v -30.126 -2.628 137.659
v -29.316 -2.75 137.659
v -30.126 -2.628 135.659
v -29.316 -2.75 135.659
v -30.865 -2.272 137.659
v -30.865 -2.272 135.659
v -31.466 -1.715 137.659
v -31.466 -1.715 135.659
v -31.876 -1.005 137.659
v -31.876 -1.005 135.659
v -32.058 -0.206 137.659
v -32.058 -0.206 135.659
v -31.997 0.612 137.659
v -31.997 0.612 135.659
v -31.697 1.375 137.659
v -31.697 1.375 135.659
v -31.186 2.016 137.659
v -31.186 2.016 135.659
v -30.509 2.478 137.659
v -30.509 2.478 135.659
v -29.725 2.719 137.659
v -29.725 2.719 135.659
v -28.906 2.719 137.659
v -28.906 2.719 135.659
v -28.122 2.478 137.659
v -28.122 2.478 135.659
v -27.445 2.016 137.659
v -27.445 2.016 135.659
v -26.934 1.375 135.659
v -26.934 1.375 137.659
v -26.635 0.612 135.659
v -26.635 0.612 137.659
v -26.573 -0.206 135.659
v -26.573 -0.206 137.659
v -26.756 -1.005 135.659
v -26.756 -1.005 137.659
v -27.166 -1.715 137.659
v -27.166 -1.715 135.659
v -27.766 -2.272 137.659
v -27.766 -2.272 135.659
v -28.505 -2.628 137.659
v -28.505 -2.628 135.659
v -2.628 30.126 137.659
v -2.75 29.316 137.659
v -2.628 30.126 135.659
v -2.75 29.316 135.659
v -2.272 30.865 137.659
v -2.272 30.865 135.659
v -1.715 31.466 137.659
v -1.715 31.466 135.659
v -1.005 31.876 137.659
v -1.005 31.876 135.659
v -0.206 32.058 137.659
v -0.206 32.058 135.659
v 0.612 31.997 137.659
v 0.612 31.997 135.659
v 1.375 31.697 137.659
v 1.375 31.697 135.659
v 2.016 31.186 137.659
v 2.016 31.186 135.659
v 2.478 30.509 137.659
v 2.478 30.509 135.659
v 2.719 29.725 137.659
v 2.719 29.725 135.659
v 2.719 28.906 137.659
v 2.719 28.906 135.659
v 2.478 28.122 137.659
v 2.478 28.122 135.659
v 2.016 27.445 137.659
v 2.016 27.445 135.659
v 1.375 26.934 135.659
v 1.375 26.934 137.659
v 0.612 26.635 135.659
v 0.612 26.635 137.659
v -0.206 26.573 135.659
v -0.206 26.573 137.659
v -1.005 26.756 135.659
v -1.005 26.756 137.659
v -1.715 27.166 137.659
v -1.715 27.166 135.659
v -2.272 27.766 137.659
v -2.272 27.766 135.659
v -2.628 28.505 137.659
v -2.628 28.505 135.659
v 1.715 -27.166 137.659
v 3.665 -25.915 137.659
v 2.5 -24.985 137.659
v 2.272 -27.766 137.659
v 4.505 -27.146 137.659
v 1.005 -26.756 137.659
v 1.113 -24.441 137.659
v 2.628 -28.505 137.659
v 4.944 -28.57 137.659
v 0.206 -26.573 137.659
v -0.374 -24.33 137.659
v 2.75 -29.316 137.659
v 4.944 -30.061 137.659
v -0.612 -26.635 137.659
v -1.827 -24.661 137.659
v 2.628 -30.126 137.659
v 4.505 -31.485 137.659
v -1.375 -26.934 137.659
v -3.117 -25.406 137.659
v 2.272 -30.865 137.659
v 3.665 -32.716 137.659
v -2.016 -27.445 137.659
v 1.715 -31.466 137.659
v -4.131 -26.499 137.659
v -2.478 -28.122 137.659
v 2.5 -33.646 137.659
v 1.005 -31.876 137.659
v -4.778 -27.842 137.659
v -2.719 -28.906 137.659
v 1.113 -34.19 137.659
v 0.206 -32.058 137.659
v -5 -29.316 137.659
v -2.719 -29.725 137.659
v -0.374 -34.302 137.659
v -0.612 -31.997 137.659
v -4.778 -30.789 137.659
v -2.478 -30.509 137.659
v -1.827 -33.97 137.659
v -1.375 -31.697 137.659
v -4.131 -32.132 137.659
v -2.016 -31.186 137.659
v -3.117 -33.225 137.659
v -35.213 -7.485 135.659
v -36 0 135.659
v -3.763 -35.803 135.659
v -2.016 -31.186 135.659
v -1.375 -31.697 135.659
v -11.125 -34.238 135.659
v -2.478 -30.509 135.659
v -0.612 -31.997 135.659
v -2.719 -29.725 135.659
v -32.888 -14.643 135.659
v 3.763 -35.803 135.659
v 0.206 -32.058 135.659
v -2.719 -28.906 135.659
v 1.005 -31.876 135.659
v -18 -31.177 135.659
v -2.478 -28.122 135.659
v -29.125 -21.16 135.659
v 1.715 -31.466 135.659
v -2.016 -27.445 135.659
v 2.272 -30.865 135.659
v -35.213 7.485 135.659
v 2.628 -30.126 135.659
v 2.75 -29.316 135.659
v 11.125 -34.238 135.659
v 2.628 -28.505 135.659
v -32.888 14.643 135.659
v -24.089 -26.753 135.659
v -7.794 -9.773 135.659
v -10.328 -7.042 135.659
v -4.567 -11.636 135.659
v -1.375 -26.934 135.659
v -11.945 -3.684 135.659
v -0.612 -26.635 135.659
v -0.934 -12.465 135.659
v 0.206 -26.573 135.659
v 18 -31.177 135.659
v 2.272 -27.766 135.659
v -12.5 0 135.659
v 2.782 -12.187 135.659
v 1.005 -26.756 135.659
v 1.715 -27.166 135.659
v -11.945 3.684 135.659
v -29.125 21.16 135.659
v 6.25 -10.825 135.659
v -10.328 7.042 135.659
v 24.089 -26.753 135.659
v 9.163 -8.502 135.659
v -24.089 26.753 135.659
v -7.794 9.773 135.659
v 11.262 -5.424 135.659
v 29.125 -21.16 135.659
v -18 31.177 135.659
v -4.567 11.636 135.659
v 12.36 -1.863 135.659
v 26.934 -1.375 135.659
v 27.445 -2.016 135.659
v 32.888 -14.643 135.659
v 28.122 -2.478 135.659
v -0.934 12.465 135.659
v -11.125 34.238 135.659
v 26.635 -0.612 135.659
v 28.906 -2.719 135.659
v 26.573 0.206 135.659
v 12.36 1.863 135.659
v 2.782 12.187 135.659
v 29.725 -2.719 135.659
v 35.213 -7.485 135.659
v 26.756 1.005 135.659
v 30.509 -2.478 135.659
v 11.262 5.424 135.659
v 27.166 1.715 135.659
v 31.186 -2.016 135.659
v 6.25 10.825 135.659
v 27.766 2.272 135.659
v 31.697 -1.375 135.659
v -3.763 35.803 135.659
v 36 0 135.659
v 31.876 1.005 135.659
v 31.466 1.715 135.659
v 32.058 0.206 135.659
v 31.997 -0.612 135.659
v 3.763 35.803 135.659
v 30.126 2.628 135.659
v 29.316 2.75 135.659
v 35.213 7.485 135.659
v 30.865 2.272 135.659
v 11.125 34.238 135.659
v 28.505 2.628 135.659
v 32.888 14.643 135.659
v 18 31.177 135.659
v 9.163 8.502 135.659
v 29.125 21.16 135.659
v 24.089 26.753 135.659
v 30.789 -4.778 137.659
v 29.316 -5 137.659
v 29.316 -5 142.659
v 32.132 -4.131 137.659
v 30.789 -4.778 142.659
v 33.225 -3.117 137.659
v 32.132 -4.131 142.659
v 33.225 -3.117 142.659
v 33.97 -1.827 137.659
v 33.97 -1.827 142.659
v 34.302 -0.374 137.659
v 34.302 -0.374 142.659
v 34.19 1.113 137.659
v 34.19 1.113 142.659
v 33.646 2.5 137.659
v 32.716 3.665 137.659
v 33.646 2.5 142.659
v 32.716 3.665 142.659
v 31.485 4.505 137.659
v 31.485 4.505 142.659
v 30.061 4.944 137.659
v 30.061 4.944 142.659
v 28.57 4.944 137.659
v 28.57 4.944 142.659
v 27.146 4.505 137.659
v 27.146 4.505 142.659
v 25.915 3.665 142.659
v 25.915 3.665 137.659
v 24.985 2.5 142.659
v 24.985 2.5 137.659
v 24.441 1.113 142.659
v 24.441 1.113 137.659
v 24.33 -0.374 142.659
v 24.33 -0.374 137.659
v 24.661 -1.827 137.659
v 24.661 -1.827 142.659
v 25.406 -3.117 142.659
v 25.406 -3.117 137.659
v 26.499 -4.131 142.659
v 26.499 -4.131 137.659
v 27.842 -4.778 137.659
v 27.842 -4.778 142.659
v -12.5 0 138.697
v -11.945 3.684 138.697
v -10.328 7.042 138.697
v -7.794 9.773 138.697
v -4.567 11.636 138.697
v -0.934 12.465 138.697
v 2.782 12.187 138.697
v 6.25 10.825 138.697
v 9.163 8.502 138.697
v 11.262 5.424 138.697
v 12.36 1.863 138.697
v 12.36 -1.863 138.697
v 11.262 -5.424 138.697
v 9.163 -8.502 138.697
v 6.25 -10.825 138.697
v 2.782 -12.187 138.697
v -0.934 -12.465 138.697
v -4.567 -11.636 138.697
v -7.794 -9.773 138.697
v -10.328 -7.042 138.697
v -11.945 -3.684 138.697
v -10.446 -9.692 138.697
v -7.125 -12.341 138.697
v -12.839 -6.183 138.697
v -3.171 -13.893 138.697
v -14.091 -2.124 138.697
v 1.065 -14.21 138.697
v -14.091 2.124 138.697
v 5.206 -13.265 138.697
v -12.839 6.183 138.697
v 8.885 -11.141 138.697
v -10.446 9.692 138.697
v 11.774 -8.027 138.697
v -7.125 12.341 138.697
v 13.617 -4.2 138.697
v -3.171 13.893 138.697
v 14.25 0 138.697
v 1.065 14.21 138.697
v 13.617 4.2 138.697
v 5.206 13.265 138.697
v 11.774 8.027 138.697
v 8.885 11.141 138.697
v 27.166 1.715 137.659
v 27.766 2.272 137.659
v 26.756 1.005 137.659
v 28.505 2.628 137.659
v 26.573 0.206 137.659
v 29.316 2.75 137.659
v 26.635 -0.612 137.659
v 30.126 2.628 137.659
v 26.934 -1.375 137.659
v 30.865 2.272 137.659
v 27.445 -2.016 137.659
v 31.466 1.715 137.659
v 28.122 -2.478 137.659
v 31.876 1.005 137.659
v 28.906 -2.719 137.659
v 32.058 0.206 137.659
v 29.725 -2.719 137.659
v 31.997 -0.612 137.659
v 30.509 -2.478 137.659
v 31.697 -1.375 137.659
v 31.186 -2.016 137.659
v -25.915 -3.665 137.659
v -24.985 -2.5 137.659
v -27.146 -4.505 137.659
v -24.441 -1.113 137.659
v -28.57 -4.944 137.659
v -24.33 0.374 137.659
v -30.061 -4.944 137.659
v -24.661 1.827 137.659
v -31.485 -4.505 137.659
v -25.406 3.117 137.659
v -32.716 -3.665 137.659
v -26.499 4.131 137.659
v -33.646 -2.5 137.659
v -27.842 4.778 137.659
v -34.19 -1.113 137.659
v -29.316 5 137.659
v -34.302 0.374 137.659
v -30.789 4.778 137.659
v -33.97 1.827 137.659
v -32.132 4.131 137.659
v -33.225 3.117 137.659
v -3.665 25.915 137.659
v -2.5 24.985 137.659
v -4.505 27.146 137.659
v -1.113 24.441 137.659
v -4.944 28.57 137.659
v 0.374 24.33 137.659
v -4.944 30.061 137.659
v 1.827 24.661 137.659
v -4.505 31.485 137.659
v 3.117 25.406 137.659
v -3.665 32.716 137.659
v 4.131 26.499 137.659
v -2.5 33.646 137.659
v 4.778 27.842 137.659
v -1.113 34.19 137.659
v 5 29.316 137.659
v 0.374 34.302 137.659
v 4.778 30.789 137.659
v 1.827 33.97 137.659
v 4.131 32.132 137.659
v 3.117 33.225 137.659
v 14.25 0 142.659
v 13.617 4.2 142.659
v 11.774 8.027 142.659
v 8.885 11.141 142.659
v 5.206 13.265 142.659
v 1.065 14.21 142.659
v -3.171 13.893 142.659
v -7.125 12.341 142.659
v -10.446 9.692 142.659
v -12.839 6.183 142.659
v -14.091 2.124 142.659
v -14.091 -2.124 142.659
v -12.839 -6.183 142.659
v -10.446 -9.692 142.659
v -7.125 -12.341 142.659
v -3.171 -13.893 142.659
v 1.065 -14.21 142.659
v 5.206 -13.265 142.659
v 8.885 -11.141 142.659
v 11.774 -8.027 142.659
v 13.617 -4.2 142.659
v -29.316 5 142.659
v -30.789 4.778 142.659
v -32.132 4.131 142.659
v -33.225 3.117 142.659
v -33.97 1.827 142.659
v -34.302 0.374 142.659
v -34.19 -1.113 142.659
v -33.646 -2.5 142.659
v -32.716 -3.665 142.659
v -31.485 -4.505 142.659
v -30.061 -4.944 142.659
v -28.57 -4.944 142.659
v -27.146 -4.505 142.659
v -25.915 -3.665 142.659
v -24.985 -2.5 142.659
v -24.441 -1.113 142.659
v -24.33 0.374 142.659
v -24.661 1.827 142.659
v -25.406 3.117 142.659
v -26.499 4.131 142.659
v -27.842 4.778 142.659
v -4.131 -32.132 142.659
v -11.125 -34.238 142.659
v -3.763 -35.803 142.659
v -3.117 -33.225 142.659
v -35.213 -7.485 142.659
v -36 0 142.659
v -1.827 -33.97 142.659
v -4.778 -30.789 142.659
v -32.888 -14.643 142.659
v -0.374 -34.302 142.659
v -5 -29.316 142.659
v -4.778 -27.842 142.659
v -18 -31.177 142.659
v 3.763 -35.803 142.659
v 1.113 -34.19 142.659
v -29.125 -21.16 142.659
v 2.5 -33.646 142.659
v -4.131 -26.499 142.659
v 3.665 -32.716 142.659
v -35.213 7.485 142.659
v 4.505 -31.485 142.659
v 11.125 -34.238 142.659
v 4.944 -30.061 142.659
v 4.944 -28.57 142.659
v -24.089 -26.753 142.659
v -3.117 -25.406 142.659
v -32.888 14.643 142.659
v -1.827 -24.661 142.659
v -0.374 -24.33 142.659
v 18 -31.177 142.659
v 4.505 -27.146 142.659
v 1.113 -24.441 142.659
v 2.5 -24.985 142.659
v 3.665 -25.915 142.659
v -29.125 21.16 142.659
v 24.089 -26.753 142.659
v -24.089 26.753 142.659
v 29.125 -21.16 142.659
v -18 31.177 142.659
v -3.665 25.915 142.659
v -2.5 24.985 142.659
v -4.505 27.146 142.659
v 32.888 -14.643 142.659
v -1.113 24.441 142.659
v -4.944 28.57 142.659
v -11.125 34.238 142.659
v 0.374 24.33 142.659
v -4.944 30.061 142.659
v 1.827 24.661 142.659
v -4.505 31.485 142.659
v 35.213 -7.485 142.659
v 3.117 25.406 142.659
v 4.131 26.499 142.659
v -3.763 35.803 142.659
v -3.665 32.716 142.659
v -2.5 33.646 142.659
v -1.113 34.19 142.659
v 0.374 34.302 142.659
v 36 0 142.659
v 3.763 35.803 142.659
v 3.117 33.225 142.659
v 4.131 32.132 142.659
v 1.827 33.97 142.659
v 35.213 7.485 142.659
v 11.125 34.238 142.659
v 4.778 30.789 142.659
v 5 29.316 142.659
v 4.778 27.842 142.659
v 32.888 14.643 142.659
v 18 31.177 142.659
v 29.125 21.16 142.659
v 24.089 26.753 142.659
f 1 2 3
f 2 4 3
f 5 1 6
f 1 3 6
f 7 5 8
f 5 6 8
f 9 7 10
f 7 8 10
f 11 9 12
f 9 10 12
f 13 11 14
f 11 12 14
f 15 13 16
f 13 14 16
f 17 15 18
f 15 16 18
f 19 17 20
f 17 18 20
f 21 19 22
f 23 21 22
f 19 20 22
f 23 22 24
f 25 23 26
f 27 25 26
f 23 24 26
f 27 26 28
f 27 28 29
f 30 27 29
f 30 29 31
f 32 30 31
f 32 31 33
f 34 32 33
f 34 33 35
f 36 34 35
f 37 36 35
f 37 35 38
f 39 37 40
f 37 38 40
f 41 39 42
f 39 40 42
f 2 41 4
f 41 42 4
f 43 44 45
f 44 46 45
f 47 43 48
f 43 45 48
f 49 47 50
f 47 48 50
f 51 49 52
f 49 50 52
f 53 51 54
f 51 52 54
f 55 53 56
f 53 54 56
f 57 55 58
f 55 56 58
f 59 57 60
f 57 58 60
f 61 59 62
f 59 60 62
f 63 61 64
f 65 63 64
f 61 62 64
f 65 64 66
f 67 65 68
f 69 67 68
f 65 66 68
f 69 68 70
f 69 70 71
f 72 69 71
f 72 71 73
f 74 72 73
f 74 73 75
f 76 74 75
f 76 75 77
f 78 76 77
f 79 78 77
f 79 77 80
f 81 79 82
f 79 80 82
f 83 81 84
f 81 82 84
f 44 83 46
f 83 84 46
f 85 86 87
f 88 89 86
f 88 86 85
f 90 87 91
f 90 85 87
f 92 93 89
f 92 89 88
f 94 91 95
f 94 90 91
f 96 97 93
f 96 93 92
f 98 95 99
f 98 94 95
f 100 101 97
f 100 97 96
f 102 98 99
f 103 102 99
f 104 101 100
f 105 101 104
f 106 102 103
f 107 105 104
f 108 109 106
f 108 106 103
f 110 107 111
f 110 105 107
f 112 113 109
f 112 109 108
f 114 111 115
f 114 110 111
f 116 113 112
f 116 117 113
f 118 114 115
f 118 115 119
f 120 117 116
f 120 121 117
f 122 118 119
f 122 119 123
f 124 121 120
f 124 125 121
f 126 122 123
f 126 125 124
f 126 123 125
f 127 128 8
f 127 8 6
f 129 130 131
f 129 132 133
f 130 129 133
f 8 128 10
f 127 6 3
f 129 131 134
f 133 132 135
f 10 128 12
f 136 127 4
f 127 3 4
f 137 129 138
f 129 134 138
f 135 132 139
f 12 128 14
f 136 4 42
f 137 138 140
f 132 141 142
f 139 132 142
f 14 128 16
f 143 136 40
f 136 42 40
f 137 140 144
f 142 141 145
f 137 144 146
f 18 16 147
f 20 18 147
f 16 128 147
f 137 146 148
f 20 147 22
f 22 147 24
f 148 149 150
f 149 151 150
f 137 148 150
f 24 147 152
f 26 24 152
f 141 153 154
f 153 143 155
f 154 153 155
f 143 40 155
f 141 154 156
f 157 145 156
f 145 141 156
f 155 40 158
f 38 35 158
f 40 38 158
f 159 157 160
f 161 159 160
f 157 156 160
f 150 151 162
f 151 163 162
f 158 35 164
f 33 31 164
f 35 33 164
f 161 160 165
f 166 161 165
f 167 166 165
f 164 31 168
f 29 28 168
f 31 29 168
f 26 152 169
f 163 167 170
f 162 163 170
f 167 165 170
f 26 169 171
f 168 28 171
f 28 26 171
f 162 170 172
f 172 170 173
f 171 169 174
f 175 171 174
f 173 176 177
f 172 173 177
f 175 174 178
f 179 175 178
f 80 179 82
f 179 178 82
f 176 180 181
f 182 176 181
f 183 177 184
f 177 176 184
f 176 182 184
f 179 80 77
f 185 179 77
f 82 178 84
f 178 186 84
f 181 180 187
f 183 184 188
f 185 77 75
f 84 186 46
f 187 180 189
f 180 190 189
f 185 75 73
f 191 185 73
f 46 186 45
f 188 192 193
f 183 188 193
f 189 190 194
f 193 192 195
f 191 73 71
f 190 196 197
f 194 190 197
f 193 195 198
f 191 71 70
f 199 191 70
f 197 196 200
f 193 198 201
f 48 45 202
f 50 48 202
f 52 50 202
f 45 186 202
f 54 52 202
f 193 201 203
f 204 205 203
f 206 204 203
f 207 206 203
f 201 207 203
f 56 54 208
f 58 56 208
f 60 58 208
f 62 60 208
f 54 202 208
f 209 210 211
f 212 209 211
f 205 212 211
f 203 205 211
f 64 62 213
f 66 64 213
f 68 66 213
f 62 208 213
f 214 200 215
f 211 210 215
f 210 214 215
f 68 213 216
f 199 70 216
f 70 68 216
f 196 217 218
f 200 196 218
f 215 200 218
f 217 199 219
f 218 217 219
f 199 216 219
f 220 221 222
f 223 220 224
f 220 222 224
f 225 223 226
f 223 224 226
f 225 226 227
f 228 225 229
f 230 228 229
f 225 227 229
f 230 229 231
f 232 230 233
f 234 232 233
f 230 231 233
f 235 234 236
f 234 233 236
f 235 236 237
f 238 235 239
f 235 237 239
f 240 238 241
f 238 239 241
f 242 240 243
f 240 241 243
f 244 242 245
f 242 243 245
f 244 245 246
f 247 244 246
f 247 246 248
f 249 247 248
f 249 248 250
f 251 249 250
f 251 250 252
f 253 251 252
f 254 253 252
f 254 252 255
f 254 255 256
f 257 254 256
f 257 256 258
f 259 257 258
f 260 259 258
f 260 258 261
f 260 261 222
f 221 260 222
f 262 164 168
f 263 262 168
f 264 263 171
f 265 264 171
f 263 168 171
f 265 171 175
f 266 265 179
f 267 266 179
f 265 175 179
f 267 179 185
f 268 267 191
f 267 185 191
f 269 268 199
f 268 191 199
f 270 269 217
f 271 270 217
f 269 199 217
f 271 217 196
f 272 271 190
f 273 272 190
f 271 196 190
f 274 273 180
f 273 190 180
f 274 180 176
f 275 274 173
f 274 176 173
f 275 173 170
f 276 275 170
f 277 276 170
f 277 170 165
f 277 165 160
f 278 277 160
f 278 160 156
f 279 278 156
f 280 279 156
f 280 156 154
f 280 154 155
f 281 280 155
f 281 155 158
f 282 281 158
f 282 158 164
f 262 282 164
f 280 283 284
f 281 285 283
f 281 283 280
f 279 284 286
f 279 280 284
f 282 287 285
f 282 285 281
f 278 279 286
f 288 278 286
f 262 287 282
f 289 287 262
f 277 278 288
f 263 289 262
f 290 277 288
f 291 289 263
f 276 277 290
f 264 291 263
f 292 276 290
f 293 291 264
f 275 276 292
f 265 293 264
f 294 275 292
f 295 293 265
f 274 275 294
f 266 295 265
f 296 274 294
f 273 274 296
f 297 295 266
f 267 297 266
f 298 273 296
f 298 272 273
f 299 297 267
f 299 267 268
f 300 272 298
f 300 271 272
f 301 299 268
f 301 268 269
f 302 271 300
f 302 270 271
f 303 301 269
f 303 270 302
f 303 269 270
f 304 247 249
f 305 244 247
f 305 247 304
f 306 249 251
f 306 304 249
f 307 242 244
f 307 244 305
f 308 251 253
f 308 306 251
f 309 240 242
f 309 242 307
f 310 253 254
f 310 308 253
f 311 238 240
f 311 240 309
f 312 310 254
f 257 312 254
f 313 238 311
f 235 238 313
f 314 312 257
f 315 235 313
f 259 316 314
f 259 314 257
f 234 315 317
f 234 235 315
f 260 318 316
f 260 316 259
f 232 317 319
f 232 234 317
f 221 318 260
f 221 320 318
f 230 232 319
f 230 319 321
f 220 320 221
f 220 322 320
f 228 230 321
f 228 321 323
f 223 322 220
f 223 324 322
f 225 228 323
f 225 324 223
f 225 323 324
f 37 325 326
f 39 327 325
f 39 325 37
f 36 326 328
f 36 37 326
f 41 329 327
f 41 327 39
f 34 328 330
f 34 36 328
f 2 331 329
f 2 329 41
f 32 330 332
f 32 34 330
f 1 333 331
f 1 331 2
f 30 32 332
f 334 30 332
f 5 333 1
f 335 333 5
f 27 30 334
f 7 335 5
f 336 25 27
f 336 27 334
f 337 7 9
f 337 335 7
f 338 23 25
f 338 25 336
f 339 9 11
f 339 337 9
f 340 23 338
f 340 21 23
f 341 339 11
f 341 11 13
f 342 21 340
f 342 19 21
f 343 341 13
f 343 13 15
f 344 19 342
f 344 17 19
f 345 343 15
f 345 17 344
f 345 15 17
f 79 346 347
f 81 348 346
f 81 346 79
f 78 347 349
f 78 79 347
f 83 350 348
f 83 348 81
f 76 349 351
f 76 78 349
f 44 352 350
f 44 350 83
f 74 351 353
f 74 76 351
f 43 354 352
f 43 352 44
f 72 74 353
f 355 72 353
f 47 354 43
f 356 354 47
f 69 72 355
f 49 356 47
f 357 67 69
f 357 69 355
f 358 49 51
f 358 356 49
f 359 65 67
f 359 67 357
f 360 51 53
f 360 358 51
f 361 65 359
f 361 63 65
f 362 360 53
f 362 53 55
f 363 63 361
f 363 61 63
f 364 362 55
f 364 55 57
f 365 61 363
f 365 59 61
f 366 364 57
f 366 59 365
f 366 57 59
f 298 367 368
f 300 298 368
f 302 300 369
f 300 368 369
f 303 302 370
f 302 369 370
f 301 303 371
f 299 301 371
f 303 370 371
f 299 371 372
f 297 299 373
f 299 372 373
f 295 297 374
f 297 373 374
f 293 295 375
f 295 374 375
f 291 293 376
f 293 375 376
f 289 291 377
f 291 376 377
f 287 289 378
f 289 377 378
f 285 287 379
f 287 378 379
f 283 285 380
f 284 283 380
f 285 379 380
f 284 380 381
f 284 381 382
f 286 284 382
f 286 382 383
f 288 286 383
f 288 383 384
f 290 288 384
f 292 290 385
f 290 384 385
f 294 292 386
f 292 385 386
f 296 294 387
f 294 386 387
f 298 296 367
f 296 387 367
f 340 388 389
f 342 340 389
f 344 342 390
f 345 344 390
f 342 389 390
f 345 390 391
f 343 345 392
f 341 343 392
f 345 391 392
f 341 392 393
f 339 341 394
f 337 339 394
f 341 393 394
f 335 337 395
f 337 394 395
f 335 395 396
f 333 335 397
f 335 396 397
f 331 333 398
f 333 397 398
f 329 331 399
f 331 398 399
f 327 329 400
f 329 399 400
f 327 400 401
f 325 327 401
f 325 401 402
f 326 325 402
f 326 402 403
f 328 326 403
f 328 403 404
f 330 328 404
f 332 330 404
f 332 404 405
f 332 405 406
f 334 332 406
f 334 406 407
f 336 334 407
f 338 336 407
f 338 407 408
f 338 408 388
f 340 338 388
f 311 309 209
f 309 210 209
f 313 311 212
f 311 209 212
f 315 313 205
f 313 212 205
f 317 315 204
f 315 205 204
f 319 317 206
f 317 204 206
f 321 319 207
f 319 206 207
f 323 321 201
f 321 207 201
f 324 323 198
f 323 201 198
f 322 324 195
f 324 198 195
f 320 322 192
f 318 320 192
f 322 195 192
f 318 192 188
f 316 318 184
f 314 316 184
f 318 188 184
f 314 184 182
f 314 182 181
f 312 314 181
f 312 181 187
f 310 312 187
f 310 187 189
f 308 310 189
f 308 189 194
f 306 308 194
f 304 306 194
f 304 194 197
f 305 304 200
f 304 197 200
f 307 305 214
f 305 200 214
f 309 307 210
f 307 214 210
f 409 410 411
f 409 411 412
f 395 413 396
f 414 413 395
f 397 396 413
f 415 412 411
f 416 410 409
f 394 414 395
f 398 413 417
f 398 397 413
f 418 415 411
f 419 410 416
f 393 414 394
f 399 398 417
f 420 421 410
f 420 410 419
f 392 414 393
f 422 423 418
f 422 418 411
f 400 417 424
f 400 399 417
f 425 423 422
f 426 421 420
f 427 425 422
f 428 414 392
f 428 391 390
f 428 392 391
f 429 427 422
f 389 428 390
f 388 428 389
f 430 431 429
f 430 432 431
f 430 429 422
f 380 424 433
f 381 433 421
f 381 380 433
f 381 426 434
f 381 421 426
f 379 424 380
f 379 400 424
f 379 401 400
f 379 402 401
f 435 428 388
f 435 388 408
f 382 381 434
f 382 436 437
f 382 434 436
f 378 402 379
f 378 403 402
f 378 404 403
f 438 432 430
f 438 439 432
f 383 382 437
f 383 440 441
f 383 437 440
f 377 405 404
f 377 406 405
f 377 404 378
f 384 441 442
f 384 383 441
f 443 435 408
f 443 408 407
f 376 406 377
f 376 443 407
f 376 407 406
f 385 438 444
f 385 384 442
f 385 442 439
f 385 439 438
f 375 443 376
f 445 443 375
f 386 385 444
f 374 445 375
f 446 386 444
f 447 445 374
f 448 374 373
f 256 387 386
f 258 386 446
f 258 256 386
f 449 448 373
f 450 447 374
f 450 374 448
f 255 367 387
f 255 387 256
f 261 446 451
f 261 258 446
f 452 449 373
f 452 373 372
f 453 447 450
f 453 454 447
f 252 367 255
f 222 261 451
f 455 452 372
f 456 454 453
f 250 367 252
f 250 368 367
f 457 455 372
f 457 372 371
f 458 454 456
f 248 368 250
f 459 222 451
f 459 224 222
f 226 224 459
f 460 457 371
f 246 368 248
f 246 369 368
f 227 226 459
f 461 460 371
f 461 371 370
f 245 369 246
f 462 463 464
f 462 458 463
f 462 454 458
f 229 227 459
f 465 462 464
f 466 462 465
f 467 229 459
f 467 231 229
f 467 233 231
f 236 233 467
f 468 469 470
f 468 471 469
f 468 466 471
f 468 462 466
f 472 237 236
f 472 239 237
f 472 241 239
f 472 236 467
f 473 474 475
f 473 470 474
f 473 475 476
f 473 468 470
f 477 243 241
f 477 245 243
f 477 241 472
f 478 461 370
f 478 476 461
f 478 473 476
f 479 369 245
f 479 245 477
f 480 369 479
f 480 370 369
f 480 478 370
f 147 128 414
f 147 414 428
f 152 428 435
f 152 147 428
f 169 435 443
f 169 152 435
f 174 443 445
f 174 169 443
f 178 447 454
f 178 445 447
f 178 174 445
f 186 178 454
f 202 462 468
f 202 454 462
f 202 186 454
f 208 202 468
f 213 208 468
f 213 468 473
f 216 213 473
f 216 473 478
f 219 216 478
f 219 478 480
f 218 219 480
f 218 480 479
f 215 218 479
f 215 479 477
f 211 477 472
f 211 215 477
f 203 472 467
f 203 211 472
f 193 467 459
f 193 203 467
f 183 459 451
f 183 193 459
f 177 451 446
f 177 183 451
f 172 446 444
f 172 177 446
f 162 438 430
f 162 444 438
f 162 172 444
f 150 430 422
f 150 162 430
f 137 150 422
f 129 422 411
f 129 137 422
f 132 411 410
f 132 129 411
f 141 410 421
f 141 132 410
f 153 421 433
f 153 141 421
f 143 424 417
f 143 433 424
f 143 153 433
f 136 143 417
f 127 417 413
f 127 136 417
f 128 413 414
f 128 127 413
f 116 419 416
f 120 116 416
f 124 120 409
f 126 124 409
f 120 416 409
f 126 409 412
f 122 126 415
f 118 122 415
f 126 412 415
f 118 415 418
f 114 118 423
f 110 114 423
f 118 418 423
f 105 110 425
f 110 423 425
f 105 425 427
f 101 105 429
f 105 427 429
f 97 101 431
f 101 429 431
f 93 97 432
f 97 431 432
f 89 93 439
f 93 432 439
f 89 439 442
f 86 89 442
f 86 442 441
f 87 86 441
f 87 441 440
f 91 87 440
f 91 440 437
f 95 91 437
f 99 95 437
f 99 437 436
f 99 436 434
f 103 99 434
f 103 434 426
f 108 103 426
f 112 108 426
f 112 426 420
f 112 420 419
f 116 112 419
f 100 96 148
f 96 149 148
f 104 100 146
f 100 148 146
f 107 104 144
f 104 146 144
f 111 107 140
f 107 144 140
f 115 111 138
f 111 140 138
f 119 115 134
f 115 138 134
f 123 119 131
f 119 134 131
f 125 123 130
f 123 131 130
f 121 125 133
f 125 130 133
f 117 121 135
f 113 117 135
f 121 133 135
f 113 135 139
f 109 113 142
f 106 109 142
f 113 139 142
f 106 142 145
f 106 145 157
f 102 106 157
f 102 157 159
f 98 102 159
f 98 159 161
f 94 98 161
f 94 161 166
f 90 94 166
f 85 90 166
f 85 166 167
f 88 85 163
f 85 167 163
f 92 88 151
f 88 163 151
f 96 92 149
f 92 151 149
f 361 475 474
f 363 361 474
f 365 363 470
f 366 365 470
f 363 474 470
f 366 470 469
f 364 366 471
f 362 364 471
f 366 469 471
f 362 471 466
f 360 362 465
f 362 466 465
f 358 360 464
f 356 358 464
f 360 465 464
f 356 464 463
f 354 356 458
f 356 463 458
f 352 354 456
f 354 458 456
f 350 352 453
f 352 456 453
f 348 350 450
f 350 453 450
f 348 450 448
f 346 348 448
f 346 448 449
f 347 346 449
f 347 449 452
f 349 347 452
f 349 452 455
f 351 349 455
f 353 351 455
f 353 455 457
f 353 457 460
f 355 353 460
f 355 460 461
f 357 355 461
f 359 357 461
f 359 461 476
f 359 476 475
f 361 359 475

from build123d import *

# Parameters (mm, degrees)
SKETCH1_W                      = 7
SKETCH1_H                      = 26.5
SKETCH2_R                      = 12.5
SHAFT_THRU_DEPTH               = 52.39066063
CBORE_FOR_M5_SHCS1_D           = 5.5
CBORE_FOR_M5_SHCS1_CBORE_D     = 10
CBORE_FOR_M5_SHCS1_CBORE_DEPTH = 5
CIRPATTERN1_COUNT              = 4
SKETCH5_R                      = 14.25
SEAL_SEAT_DEPTH                = 3.9624


with BuildPart() as part:
    # Sketch1 → Main_body (revolve)
    with BuildSketch(Plane(origin=(0, 0, 0), x_dir=(0, 0, -1), z_dir=(1, 0, 0)), mode=Mode.PRIVATE) as main_body_sk:
        with Locations((-139.159, -22.75)):
            Rectangle(SKETCH1_W, SKETCH1_H)
        with Locations((-139.159, 22.75)):
            Rectangle(SKETCH1_W, SKETCH1_H)
    revolve(main_body_sk.sketch.rotate(Axis((0, 0, 1000), (0, 0, -1)), 270), axis=Axis((0, 0, 1000), (0, 0, -1)))

    # Sketch2 → Shaft_thru (cut, through all)
    with BuildSketch(Plane(origin=(0, 0, 135.659), x_dir=(-1, 0, 0), z_dir=(0, 0, -1))):
        Circle(SKETCH2_R)
    extrude(amount=-SHAFT_THRU_DEPTH, mode=Mode.SUBTRACT)

    # CBORE for M5 SHCS1 (through all)
    with Locations(Plane.XY.offset(142.659)):
        with Locations((0, 29.3156)):
            cbore_for_m5_shcs1 = CounterBoreHole(CBORE_FOR_M5_SHCS1_D / 2, CBORE_FOR_M5_SHCS1_CBORE_D / 2, CBORE_FOR_M5_SHCS1_CBORE_DEPTH)

    # CirPattern1: CBORE for M5 SHCS1 ×4 about axis
    cirpattern1_axis = Axis((0, 0, 0), (0, 0, 1))
    for i in range(1, CIRPATTERN1_COUNT):
        add(cbore_for_m5_shcs1.rotate(cirpattern1_axis, i * 360 / CIRPATTERN1_COUNT), mode=Mode.SUBTRACT)

    # Sketch5 → seal_seat (cut)
    with BuildSketch(Plane.XY.offset(142.659)):
        Circle(SKETCH5_R)
    extrude(amount=-SEAL_SEAT_DEPTH, mode=Mode.SUBTRACT)


solid = part.part
